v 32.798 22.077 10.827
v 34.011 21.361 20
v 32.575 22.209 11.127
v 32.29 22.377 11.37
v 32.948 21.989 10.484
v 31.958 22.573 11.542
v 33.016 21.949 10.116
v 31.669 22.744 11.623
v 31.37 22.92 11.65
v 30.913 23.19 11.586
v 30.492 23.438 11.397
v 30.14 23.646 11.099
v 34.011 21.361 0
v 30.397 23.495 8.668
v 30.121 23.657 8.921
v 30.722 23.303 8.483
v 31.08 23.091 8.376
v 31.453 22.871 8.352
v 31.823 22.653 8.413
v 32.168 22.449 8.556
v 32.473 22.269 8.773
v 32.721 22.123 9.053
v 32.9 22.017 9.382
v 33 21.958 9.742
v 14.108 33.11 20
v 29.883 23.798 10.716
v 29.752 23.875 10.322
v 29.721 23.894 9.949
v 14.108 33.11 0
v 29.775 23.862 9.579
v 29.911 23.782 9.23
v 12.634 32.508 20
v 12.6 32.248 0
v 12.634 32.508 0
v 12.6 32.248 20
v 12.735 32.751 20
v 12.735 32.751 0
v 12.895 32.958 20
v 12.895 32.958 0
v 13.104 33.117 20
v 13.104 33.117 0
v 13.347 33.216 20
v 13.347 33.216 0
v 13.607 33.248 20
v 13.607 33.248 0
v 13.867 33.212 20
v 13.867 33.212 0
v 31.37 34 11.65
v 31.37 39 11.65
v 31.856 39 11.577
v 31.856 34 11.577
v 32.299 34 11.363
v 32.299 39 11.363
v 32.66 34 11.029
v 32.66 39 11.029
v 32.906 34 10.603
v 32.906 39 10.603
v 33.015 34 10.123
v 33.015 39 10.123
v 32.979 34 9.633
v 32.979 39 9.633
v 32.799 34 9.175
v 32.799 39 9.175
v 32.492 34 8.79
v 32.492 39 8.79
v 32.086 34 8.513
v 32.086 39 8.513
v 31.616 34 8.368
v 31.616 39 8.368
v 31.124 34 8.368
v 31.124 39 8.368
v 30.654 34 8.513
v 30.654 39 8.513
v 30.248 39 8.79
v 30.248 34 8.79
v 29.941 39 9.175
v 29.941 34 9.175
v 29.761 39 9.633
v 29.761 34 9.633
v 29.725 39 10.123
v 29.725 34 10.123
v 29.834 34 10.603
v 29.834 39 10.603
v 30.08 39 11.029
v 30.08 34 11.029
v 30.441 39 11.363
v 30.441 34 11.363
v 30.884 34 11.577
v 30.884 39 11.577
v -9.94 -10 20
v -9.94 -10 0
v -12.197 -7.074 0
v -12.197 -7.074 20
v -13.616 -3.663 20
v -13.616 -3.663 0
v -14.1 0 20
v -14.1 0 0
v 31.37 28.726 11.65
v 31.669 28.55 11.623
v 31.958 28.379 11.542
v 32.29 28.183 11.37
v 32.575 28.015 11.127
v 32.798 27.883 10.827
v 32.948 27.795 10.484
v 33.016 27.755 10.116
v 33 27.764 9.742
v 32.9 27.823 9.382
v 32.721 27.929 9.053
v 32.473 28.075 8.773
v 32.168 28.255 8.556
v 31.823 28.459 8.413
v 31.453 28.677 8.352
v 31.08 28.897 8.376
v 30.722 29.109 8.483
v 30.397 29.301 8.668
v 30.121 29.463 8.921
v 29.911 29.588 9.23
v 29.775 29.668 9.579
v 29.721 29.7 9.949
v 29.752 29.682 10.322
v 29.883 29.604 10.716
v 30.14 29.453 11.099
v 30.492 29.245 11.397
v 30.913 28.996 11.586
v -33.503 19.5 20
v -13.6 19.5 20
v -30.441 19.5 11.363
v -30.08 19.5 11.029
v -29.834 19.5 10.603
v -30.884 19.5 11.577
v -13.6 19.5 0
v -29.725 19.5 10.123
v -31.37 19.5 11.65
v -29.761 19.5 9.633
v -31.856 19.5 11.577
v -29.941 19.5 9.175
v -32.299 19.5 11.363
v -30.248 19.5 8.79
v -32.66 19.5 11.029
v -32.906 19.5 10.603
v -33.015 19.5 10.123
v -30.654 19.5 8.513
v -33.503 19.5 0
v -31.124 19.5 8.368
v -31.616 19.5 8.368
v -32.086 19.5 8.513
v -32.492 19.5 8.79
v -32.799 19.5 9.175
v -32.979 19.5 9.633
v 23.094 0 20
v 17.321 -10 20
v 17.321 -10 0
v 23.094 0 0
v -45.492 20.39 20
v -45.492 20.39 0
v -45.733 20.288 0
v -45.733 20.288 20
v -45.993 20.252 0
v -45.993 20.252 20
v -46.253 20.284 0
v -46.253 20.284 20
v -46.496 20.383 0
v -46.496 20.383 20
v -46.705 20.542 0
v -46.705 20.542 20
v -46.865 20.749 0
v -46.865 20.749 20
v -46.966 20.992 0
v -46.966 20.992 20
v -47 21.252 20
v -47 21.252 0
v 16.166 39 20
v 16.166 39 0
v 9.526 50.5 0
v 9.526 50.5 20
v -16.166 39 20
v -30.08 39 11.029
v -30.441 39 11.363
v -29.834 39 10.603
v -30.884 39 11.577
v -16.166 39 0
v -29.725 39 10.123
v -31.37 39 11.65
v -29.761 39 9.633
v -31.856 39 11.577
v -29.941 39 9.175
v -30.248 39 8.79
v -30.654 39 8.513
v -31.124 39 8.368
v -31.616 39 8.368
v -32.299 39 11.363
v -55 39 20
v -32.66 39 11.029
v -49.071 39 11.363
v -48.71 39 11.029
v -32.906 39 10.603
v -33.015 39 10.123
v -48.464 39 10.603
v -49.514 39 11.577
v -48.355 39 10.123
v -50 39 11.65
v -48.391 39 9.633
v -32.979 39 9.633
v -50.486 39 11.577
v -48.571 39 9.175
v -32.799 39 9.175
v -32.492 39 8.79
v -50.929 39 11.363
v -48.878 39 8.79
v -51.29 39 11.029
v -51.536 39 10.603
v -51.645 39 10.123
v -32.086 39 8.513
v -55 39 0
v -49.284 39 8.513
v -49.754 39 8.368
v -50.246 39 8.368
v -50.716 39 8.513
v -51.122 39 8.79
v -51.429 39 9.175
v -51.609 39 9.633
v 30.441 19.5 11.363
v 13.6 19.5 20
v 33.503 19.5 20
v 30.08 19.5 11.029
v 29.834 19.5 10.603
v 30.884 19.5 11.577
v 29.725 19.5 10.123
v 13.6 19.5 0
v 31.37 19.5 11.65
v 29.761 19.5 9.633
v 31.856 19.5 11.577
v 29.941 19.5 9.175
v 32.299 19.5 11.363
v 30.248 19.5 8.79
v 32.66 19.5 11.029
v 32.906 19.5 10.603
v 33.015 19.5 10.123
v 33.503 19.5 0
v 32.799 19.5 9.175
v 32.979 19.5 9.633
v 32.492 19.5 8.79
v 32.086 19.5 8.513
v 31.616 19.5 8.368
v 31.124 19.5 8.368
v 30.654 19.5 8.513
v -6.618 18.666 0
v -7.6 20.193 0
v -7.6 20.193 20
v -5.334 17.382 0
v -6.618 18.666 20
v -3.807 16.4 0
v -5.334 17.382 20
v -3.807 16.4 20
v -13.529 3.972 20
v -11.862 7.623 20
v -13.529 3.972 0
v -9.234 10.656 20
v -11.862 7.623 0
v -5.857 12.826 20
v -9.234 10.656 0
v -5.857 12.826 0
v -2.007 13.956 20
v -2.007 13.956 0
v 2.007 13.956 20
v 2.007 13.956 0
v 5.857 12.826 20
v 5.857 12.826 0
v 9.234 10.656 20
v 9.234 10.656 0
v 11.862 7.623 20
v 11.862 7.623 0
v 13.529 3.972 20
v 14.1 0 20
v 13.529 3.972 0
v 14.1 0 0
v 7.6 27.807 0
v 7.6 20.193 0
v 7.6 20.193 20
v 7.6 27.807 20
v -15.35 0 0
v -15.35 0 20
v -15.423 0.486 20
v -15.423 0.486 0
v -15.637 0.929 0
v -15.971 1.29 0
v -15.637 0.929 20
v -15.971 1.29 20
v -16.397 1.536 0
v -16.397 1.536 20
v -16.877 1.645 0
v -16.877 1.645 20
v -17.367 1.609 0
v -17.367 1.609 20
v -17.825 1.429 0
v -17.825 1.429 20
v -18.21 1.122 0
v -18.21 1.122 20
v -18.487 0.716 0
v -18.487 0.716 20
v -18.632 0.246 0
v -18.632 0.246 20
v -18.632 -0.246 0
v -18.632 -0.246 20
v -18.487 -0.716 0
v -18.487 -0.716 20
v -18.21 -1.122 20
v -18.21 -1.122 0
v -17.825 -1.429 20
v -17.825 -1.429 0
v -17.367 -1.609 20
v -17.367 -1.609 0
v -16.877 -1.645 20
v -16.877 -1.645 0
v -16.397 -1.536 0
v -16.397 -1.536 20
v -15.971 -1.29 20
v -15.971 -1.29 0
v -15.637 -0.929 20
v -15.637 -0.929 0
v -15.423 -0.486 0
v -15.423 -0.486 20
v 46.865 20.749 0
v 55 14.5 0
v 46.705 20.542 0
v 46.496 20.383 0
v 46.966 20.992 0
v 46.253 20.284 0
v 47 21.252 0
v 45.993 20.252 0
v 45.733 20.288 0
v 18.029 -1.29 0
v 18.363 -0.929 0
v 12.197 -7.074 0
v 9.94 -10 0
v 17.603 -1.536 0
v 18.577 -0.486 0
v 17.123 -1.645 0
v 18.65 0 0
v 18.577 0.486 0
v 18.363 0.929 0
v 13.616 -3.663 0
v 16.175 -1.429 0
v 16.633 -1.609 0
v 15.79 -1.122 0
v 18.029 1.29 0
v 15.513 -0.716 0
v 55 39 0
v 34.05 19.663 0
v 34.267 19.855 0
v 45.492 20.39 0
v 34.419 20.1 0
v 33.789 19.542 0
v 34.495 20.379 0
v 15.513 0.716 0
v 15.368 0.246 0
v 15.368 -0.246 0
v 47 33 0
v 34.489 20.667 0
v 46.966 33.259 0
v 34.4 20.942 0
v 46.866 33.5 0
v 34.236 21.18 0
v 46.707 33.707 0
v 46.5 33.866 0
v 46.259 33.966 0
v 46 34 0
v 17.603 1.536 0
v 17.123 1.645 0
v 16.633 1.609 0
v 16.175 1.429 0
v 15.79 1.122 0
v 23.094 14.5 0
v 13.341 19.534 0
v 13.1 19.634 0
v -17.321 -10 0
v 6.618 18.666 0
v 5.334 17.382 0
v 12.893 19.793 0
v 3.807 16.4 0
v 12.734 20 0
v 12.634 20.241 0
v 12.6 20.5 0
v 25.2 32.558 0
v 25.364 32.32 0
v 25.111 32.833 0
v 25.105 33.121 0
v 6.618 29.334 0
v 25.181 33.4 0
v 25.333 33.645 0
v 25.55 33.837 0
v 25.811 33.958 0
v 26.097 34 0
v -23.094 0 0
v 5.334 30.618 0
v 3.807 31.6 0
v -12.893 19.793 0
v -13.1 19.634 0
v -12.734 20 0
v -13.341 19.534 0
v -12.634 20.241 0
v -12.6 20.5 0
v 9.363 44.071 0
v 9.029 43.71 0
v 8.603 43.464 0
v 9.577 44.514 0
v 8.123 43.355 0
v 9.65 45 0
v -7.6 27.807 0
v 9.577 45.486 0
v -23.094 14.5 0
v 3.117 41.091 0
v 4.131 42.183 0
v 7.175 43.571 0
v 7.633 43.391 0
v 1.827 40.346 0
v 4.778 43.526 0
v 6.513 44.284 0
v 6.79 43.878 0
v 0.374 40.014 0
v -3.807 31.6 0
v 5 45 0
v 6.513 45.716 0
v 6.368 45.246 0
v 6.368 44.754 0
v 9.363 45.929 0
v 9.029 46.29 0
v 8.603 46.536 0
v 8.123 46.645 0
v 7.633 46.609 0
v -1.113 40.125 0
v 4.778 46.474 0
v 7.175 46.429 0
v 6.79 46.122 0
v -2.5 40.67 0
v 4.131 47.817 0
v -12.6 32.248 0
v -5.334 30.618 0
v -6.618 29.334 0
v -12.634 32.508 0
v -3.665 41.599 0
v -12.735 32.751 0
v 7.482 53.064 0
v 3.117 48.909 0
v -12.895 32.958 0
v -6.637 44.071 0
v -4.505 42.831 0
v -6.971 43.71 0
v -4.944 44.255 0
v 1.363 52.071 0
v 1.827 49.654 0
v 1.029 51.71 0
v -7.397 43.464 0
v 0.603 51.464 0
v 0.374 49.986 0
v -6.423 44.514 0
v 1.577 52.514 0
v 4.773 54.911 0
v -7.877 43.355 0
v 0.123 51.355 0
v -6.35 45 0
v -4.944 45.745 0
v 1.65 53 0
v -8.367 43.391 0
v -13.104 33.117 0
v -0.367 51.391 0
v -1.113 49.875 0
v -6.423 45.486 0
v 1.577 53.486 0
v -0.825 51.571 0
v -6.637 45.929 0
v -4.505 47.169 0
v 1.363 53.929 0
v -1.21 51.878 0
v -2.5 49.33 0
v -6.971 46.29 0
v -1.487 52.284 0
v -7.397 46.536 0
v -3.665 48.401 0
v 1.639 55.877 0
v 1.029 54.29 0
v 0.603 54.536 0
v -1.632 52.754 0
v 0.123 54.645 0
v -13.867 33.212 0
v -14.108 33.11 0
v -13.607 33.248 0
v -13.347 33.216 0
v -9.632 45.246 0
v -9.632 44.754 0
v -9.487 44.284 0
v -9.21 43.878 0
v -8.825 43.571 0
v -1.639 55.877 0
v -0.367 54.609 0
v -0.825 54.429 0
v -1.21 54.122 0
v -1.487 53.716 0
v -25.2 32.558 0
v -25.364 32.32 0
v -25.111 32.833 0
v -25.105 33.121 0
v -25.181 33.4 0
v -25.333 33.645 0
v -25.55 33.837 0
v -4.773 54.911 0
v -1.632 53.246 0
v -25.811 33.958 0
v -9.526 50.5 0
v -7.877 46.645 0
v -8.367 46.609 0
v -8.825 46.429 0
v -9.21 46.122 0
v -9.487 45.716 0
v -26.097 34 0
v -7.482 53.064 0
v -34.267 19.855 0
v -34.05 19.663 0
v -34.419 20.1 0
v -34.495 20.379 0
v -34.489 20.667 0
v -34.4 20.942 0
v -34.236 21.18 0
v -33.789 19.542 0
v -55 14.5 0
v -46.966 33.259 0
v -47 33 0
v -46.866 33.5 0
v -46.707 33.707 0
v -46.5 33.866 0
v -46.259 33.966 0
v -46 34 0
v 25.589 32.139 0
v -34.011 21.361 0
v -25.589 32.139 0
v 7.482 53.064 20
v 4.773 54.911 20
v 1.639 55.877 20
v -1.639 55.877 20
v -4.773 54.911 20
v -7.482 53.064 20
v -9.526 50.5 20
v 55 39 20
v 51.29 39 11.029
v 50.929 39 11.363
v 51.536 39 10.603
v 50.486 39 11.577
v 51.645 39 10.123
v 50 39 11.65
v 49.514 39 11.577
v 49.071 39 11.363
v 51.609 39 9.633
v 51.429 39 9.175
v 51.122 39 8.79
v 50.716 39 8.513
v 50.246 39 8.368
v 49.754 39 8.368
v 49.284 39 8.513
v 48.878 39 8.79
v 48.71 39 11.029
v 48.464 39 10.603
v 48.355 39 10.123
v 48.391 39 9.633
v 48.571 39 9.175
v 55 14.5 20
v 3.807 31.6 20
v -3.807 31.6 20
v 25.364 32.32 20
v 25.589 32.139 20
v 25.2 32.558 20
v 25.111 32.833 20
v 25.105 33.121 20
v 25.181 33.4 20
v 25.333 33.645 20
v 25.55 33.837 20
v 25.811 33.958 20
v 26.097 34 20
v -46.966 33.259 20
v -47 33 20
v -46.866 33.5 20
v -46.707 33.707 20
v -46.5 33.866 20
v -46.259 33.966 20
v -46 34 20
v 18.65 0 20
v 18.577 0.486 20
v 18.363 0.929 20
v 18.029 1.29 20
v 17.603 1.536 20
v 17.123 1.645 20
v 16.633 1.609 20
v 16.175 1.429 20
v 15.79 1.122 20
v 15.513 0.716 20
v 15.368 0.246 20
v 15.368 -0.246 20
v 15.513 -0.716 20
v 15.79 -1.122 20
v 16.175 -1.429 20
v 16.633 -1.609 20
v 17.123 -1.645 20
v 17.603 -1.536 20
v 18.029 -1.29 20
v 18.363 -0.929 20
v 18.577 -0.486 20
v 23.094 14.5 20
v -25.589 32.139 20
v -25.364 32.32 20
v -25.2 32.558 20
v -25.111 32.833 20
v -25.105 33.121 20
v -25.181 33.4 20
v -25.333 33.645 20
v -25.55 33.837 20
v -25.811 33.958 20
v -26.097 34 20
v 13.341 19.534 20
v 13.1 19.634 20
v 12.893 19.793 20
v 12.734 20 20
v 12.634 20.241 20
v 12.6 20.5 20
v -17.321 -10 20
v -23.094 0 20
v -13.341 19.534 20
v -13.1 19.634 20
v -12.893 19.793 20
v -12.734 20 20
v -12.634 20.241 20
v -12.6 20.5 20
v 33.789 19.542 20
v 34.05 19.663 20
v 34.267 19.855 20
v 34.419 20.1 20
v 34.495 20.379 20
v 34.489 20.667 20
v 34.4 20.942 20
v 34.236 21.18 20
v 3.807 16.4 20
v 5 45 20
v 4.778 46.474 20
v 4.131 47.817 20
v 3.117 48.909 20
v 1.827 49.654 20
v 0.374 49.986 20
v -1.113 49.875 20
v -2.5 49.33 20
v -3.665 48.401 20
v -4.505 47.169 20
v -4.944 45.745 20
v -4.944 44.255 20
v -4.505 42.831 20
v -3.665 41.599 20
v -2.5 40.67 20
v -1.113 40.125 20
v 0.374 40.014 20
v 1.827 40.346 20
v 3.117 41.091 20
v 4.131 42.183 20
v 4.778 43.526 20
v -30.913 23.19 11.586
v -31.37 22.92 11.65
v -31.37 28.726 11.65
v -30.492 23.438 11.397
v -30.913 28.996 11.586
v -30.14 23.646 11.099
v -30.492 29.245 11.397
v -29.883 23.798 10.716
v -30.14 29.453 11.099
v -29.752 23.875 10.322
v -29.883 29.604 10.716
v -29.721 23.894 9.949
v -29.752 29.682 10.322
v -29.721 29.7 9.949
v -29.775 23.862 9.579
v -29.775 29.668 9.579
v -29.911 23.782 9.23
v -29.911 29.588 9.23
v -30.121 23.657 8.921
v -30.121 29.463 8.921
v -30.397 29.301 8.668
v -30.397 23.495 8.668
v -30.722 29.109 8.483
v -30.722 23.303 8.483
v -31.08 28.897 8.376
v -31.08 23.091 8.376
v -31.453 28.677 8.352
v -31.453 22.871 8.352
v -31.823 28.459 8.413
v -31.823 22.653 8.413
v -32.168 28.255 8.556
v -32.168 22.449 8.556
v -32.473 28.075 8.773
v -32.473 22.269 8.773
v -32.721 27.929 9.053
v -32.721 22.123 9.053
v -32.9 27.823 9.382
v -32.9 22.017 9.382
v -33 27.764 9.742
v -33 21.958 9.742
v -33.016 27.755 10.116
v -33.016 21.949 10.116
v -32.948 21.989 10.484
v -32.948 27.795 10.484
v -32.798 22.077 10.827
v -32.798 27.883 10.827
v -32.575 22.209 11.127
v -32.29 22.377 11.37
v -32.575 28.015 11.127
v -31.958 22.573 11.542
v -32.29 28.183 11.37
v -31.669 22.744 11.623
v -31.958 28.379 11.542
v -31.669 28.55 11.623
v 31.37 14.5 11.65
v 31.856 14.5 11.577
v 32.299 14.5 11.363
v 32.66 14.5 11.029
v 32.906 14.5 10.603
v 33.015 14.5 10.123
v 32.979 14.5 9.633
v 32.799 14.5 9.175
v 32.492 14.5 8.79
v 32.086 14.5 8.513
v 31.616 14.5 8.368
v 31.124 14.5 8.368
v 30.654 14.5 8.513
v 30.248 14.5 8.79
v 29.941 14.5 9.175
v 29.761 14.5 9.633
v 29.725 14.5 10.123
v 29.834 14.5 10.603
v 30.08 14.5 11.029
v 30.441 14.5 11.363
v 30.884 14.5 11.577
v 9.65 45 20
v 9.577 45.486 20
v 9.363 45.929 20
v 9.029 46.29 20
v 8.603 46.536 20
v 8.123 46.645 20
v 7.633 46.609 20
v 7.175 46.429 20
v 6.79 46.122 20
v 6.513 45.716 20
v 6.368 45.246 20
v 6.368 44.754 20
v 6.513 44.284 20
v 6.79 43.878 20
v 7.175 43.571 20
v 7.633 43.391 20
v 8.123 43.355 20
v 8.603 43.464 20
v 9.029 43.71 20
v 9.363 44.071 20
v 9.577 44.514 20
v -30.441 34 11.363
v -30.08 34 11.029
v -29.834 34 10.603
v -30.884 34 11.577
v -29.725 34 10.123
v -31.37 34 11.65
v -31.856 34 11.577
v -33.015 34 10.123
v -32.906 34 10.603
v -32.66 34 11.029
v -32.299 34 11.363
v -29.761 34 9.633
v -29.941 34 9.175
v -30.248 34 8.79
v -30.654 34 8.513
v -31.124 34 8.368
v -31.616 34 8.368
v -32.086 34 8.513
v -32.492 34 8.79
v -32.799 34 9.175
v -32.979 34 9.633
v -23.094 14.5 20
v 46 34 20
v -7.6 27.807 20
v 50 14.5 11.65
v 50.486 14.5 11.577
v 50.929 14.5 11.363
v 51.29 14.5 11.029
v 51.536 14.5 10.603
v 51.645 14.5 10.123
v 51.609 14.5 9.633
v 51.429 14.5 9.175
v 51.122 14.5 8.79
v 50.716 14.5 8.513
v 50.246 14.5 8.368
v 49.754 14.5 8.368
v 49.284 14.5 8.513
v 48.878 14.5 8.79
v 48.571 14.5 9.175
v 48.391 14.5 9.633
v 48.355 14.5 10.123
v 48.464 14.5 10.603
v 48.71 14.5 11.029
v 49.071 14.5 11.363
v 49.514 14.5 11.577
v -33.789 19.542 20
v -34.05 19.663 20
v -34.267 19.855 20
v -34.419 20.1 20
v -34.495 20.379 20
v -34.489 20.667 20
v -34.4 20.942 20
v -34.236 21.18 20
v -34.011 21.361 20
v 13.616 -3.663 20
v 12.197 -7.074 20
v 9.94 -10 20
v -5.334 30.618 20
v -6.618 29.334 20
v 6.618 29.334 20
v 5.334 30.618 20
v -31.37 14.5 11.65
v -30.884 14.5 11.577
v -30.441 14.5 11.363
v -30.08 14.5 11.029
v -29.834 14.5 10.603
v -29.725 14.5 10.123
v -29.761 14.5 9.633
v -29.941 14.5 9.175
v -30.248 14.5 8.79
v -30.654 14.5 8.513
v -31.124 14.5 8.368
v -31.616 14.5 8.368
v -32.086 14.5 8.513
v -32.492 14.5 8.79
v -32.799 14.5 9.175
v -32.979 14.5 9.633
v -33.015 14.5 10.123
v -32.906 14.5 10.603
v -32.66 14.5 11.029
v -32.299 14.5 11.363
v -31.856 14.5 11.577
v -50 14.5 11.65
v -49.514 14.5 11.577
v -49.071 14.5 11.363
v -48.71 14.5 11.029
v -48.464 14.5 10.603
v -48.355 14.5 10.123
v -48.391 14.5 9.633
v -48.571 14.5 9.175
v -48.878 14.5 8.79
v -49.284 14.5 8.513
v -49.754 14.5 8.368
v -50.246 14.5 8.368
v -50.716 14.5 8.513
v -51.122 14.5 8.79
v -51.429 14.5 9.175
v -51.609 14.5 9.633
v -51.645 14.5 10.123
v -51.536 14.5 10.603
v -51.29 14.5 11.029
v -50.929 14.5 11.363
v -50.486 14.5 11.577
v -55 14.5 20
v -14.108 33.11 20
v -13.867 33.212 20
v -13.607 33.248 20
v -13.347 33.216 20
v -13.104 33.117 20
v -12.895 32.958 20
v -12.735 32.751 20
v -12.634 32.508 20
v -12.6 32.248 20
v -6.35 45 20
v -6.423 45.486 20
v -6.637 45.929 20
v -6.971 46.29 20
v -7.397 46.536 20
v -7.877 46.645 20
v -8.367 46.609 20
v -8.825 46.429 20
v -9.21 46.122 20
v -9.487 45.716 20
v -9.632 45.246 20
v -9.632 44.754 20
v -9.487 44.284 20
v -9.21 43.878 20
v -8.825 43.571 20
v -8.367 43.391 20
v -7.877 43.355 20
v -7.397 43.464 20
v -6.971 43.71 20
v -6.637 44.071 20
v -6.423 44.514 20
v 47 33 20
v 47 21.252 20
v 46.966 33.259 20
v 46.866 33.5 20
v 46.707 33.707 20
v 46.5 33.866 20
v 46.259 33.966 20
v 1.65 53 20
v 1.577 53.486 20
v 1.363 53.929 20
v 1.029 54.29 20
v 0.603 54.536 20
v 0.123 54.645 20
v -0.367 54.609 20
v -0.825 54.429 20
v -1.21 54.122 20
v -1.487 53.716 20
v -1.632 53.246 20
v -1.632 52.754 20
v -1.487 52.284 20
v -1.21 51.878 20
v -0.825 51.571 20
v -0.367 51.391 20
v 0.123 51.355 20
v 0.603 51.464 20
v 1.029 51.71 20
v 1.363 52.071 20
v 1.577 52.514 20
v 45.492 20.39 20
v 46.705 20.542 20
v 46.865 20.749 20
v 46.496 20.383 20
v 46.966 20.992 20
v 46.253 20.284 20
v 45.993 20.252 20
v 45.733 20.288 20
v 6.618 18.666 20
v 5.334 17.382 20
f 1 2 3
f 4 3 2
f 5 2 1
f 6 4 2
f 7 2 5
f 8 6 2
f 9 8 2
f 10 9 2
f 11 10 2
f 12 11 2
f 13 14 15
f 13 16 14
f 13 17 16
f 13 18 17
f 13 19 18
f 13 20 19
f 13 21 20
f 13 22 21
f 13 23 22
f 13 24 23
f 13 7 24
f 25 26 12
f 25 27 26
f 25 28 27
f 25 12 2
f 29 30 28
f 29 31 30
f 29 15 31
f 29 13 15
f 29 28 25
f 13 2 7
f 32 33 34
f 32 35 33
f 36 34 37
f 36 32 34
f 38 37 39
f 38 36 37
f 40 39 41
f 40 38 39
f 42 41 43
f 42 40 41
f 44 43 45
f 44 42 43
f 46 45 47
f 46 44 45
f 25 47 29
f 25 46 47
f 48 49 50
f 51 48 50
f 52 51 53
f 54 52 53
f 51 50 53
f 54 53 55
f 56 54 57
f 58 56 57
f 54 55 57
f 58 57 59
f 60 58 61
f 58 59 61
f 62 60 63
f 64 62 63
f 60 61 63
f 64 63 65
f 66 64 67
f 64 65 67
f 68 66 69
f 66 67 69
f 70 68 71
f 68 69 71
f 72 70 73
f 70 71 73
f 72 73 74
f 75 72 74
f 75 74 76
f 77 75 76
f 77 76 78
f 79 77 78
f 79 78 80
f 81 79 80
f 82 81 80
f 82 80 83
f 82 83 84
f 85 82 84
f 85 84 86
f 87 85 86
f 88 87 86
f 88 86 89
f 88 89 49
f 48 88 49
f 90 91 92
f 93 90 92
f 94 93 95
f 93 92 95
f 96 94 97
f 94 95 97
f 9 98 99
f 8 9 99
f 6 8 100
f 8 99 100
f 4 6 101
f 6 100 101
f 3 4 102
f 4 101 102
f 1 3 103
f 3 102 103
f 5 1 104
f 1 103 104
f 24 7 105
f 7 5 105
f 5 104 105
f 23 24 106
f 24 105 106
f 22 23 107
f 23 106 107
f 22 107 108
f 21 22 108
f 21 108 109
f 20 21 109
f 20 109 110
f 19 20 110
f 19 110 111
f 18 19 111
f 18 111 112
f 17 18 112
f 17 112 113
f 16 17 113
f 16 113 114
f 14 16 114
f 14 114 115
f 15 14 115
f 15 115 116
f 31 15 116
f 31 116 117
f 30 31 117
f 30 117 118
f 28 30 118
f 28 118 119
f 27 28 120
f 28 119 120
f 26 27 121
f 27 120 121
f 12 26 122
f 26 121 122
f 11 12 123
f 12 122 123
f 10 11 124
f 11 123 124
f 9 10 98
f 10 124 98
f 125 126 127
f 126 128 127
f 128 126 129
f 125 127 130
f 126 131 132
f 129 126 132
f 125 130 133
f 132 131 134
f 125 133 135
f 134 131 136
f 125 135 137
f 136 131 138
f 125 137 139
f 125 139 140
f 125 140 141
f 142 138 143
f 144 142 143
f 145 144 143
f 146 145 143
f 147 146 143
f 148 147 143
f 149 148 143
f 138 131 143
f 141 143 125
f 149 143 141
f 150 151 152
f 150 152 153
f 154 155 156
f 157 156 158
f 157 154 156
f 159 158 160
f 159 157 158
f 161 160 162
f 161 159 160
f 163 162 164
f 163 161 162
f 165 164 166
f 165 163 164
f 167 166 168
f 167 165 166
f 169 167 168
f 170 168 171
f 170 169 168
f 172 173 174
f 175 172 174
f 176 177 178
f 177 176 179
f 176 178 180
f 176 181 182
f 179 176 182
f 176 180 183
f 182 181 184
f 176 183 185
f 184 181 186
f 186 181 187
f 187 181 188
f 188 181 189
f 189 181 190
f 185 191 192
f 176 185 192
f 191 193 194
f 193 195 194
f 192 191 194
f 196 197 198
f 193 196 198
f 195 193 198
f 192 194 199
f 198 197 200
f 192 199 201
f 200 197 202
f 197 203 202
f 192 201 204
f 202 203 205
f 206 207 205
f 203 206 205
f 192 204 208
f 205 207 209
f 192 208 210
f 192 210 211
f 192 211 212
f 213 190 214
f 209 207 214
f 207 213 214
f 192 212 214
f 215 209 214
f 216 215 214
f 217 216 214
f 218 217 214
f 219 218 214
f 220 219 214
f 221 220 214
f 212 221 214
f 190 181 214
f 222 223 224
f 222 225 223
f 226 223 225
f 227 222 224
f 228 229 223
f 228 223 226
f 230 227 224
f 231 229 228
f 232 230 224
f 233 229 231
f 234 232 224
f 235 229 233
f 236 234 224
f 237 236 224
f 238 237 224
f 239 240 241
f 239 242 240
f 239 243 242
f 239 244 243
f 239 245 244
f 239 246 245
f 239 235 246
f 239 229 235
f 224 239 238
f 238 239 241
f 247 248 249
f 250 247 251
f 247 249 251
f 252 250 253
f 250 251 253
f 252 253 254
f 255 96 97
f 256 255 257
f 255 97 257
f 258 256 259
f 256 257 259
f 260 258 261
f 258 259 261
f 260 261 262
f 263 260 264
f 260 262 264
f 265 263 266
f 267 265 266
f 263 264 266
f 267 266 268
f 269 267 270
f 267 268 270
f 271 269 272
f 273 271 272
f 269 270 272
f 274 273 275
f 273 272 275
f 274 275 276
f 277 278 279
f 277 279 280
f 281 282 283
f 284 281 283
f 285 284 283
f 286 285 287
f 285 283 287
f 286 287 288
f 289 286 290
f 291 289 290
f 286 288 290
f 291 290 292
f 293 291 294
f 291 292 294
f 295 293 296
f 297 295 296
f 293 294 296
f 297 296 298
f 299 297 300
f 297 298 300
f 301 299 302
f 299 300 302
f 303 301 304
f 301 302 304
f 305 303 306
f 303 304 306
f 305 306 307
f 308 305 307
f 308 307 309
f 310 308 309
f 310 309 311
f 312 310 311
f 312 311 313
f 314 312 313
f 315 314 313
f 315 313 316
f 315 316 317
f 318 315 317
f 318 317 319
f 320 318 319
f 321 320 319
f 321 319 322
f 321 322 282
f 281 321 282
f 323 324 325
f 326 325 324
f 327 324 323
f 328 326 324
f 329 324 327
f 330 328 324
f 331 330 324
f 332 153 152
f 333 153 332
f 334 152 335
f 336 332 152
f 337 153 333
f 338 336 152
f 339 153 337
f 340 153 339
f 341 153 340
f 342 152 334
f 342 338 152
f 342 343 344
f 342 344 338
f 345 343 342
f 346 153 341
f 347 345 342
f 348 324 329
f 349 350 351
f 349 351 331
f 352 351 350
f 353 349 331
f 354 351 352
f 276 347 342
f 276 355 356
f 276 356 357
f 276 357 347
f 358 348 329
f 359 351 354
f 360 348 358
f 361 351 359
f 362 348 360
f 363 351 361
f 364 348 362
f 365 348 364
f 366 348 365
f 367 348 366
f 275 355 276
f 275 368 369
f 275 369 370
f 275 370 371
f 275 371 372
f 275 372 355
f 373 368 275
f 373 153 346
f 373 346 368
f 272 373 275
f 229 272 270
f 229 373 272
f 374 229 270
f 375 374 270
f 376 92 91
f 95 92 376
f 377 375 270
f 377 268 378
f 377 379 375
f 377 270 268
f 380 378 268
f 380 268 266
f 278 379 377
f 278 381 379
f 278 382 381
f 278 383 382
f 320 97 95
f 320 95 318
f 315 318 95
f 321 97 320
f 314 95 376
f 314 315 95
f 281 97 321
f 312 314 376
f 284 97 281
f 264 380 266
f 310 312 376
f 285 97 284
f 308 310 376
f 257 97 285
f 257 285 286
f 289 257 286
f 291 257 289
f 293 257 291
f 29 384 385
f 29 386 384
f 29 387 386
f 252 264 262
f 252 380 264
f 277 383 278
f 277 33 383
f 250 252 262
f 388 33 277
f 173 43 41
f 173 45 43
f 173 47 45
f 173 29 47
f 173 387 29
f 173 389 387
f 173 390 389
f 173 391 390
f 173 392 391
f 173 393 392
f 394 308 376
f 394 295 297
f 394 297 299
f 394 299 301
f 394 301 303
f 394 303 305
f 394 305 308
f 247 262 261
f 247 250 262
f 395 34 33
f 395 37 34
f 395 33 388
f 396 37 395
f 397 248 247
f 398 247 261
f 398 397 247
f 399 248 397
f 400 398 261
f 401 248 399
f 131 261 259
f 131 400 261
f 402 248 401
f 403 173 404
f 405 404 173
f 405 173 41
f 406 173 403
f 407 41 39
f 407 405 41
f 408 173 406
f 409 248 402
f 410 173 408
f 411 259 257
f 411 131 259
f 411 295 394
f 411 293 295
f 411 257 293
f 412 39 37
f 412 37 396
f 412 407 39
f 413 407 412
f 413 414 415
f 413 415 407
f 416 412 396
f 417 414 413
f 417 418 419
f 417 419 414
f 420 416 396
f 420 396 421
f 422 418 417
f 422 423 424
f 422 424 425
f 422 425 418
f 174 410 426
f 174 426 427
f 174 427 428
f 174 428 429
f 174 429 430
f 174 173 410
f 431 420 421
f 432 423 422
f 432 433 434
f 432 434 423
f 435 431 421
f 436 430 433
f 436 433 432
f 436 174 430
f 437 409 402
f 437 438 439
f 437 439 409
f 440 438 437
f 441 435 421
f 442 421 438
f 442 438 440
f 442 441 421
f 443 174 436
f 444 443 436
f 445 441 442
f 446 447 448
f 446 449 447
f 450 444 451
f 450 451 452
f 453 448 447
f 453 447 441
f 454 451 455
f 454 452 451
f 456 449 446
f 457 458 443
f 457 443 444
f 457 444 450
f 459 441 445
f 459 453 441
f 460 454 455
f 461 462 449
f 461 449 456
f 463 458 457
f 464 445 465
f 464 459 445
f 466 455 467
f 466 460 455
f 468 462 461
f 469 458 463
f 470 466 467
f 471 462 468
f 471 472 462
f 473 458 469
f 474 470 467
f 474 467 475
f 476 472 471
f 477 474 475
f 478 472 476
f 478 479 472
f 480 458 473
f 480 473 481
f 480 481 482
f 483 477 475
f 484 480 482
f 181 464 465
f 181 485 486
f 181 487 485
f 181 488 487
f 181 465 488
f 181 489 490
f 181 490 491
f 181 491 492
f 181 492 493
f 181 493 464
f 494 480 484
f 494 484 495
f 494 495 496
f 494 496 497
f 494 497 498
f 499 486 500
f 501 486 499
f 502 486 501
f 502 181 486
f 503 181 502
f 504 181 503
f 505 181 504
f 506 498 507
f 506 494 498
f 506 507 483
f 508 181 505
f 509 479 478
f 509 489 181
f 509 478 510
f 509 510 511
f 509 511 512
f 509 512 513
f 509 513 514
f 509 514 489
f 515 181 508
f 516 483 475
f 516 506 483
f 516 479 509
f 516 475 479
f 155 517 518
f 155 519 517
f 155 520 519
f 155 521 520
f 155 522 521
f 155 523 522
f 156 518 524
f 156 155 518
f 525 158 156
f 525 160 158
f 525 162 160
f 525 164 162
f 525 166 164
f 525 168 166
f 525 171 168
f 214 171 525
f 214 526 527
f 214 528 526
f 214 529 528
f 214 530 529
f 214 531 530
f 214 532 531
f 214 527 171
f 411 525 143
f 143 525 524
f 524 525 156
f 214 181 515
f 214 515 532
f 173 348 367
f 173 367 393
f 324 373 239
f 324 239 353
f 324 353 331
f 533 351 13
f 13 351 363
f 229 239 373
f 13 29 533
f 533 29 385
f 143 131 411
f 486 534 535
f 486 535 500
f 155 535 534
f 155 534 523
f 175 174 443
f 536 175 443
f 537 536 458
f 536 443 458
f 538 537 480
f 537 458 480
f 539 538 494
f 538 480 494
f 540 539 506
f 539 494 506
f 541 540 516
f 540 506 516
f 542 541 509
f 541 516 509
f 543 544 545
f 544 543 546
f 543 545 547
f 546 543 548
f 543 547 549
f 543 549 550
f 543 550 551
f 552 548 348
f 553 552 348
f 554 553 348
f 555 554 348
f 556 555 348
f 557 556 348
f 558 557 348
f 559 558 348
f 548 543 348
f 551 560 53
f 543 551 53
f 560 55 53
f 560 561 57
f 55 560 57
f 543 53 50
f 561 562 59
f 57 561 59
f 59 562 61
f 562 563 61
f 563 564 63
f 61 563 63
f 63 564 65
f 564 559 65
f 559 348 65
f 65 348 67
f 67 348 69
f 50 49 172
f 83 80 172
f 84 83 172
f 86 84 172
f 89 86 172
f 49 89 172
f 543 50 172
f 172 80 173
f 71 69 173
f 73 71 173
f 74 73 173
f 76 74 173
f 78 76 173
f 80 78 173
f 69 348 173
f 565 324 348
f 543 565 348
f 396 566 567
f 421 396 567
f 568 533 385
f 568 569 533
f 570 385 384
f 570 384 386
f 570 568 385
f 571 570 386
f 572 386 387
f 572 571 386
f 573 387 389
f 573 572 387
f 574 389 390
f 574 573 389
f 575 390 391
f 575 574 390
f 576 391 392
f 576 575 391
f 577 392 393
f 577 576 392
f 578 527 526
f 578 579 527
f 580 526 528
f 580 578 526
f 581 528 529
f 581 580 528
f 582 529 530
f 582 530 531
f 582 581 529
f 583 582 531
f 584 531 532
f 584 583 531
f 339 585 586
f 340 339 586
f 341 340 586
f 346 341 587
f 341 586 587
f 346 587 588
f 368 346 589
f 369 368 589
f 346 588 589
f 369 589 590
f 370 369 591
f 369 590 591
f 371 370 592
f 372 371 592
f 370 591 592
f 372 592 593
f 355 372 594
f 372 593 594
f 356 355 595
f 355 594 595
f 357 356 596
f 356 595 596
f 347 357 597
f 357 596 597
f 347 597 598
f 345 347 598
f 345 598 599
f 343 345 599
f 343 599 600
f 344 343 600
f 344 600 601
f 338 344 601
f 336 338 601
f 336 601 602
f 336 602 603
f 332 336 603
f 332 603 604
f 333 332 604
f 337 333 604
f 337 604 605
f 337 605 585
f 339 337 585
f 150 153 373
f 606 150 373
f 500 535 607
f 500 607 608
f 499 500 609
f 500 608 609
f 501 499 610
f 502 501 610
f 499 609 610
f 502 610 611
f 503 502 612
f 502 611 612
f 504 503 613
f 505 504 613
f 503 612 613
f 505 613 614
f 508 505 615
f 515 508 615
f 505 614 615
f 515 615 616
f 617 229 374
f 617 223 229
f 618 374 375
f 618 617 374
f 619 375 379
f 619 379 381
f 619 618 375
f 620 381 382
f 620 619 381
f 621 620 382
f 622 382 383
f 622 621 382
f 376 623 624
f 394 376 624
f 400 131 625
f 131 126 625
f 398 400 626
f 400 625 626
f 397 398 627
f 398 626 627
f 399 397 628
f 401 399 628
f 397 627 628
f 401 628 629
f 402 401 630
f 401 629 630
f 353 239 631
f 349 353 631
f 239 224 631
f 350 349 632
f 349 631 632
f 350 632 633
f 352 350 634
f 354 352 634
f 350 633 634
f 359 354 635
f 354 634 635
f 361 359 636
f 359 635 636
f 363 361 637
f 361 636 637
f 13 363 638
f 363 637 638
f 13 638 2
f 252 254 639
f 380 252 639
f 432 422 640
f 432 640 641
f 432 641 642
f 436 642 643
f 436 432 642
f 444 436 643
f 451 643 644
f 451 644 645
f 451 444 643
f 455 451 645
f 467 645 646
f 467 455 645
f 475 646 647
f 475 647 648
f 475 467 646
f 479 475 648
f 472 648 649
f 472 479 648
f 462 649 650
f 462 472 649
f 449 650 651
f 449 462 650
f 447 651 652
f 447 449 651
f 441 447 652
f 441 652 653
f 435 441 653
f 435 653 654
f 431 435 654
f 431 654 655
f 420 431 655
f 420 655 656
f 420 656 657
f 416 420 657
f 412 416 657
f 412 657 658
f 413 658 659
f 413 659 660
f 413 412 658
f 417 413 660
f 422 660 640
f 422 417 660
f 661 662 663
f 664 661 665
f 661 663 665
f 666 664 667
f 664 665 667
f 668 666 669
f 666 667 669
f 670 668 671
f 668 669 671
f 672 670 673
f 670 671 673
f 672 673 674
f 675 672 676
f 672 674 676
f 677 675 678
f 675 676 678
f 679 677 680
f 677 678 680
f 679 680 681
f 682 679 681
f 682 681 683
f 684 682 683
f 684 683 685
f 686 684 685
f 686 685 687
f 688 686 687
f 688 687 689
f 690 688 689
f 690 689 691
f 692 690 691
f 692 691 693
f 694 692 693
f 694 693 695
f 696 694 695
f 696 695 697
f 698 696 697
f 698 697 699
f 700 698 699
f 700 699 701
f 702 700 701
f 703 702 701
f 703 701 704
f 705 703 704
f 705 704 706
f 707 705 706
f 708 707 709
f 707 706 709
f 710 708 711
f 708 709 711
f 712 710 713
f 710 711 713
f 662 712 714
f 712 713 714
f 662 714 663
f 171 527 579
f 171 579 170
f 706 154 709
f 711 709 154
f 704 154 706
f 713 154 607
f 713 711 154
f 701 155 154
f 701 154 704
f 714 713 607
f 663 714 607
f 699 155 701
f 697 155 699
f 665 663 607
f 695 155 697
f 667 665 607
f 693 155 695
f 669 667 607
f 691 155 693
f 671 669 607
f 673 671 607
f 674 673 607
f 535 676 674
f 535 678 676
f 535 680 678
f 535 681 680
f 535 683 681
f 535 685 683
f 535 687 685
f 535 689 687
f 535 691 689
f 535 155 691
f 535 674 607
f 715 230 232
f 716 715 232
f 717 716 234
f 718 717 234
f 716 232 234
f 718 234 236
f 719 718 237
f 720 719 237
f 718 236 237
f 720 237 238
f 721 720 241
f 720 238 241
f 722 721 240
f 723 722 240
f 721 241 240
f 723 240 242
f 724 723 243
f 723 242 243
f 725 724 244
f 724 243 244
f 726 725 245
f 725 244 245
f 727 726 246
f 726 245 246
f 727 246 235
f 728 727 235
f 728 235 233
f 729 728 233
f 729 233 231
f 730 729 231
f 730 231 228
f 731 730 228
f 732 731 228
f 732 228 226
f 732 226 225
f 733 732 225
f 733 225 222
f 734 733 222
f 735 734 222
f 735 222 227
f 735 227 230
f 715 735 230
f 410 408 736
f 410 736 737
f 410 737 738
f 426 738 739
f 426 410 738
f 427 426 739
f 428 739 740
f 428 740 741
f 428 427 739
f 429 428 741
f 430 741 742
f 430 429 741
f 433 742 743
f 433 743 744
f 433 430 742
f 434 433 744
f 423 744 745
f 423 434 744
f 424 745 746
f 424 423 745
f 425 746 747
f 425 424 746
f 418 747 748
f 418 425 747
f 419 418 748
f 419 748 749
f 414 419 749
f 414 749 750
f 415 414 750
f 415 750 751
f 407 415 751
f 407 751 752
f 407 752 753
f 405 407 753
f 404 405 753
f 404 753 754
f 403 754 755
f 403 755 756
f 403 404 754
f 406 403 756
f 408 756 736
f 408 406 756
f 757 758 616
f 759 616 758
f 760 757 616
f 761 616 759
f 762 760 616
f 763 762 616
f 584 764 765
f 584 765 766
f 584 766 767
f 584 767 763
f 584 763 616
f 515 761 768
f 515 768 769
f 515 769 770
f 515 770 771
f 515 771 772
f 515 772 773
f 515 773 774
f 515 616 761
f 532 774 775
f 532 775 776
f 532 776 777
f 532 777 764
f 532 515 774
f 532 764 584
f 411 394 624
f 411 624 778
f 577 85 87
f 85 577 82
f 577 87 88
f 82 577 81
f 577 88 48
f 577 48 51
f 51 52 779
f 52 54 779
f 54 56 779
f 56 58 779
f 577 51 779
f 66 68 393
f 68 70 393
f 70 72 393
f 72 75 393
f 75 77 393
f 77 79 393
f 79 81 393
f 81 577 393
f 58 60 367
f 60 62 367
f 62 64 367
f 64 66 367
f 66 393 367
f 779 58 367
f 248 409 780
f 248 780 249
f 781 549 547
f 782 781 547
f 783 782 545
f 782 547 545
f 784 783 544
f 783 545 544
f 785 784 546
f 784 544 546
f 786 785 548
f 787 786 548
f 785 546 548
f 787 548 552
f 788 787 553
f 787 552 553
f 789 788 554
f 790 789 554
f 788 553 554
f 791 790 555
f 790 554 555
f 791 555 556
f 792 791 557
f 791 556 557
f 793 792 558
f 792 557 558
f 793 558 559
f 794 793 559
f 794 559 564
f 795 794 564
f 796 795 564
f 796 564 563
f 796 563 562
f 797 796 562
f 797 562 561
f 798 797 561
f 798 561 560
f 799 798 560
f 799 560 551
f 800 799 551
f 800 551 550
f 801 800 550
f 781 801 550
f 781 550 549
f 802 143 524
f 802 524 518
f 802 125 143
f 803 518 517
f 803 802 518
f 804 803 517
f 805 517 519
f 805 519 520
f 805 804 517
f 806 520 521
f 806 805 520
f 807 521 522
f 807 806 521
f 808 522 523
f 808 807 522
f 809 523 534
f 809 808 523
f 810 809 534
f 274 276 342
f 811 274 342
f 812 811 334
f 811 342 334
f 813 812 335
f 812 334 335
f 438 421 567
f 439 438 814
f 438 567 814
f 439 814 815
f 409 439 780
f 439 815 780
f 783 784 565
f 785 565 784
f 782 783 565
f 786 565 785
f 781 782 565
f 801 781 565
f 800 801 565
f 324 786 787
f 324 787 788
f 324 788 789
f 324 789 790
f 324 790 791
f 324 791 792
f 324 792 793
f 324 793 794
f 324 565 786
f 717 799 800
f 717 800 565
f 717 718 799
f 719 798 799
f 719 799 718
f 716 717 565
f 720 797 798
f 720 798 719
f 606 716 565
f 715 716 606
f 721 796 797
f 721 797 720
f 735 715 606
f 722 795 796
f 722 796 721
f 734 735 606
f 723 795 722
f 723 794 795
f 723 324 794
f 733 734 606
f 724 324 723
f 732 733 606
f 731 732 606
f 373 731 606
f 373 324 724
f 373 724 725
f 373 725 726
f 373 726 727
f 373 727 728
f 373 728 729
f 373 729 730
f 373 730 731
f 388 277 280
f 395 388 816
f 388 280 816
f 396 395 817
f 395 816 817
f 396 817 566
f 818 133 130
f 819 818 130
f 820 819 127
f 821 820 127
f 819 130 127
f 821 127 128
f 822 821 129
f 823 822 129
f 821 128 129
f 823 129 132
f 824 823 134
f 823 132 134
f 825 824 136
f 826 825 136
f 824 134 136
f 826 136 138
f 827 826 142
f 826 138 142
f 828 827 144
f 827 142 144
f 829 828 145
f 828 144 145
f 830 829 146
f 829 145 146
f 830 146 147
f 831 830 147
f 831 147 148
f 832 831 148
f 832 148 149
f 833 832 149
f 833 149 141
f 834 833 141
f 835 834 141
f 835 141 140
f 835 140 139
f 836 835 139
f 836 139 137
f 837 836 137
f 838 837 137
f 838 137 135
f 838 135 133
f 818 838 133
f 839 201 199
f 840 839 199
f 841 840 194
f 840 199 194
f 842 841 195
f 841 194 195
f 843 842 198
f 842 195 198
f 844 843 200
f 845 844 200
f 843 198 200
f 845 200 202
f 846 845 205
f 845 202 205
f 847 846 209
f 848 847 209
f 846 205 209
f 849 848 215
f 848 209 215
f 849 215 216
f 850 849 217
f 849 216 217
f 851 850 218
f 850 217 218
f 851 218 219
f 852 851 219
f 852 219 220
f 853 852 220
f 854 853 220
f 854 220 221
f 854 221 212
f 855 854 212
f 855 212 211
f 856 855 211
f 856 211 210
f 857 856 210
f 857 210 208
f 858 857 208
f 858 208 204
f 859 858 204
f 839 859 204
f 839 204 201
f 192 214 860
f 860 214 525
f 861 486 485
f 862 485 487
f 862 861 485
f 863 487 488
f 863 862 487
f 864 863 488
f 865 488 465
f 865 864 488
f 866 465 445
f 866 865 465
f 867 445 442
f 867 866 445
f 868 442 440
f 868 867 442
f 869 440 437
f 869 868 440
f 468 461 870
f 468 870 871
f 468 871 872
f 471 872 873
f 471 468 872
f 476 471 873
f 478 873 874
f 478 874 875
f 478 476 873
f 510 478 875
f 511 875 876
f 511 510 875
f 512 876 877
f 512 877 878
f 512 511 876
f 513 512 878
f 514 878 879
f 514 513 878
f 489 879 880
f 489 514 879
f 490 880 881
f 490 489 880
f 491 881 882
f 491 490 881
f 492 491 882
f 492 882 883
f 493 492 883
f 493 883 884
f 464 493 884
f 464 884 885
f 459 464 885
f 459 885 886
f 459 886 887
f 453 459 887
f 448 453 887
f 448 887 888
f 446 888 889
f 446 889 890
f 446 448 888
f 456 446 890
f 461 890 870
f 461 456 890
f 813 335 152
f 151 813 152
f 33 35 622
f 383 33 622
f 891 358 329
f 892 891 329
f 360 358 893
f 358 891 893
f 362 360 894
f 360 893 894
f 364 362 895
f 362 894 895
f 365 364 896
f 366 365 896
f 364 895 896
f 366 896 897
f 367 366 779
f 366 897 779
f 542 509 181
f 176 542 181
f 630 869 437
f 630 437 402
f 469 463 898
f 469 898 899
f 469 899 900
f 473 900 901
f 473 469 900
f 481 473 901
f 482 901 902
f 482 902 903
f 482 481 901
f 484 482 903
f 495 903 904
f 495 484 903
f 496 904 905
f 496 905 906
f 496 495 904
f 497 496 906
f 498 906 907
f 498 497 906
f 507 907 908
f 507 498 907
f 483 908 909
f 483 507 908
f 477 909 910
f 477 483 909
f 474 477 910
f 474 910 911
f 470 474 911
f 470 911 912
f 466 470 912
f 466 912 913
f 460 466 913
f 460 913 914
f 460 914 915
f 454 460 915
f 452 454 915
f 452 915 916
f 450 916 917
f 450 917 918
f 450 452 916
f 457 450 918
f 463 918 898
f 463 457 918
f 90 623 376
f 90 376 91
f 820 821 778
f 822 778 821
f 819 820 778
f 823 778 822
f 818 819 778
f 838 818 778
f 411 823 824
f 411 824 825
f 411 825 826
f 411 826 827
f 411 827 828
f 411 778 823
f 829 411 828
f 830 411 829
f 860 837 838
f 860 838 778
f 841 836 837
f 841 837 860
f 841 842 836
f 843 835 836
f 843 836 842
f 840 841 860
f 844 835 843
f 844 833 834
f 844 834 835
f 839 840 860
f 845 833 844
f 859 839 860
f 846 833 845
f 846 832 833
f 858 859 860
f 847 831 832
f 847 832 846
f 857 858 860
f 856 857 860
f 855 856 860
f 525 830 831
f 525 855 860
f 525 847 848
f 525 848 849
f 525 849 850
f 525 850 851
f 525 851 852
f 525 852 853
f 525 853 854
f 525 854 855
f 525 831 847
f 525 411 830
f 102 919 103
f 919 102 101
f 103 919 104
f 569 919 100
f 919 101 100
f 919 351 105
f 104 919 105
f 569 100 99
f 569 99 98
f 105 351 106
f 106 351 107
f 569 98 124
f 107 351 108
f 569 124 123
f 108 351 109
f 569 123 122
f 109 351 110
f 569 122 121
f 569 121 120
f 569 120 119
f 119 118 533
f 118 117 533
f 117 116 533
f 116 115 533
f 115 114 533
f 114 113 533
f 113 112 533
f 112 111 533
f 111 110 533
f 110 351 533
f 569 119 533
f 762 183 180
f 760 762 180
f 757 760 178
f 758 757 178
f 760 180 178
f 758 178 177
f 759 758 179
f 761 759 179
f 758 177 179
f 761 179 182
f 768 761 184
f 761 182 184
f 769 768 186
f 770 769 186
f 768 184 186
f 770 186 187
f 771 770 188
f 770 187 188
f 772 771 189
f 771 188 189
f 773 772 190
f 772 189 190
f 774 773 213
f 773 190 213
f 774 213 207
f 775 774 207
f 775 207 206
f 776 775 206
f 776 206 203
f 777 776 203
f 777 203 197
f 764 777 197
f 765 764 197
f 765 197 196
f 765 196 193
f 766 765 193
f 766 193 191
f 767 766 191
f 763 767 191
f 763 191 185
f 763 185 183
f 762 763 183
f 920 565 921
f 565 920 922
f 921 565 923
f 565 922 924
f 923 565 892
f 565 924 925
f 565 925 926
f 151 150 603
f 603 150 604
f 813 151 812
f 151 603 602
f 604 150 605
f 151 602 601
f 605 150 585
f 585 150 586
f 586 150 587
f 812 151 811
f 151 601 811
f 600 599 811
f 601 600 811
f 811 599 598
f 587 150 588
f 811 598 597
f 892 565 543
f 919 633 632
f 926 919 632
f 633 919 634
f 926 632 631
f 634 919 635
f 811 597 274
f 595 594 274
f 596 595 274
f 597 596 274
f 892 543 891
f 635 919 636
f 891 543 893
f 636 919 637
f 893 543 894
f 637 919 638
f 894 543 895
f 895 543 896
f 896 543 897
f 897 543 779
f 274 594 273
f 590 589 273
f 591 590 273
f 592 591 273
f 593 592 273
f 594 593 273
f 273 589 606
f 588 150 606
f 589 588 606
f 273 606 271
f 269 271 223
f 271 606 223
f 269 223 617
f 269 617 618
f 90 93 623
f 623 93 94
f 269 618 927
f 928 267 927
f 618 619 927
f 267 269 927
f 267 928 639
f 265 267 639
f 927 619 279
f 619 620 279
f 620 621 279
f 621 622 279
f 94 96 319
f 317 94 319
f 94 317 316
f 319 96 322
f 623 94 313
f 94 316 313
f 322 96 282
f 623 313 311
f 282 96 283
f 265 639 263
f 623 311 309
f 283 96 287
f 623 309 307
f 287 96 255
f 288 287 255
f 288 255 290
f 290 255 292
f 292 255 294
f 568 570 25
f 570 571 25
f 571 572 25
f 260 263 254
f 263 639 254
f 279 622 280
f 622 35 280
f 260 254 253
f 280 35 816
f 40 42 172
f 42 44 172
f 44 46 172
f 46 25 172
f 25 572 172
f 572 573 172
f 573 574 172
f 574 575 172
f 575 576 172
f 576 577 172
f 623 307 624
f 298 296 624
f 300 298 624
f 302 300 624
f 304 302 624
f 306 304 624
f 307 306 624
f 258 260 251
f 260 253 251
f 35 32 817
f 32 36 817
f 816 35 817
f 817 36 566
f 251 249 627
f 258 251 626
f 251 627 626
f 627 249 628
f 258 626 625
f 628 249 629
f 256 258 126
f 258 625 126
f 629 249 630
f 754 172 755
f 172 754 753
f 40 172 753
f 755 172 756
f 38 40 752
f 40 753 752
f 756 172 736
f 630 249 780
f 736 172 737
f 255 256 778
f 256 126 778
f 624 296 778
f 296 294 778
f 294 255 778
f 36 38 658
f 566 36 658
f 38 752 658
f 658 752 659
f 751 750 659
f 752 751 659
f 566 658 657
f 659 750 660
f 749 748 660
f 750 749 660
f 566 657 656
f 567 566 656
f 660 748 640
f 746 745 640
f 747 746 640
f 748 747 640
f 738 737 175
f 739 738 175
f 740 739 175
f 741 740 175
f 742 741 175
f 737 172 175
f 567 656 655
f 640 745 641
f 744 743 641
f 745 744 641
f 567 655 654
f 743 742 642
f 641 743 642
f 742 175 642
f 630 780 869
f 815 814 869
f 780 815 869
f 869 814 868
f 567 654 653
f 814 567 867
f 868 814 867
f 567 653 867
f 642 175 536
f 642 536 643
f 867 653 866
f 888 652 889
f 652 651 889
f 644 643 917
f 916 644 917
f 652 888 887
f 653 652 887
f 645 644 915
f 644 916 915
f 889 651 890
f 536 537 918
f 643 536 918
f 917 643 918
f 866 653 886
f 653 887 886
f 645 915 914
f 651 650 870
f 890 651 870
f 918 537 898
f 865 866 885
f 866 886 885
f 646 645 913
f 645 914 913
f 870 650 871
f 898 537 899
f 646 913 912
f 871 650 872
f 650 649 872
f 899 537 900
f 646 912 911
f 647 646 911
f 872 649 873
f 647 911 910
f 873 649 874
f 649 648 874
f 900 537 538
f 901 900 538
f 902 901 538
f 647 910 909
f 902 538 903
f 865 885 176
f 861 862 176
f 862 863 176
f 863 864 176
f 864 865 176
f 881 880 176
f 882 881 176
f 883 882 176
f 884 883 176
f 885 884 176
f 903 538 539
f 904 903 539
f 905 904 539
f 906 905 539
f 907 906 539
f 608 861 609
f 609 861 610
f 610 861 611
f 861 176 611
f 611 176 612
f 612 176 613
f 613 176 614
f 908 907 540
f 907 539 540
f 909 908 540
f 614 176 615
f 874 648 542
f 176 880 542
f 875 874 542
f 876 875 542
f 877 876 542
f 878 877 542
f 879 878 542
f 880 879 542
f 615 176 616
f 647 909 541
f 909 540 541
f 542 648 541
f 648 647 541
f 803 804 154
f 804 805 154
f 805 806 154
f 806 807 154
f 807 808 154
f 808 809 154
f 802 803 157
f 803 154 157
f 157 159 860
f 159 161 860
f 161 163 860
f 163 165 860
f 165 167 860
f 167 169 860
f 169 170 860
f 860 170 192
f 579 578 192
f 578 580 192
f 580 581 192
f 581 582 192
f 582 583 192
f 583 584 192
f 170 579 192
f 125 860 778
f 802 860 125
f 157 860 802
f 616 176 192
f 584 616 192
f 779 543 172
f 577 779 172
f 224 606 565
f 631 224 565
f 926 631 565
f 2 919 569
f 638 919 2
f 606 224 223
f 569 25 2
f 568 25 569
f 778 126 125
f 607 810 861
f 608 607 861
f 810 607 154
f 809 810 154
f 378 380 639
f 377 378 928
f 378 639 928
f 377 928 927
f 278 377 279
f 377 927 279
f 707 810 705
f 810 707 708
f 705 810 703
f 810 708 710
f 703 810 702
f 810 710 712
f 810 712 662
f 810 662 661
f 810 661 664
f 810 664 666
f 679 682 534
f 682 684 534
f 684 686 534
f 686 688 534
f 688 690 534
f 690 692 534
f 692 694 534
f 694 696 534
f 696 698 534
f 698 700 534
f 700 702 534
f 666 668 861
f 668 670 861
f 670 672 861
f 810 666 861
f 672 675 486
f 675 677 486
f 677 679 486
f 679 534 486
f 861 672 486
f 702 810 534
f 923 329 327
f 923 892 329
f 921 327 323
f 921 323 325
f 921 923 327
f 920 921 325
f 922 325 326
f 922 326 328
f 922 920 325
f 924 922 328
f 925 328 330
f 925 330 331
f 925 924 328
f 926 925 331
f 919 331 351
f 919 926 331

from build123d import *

# Parameters (mm, degrees)
SKETCH_1_R          = 5
SKETCH_1_R_2        = 1.65
EXTRUDE_1_DEPTH     = 20
SKETCH_2_R          = 1.65
CUT_EXTRUDE_1_DEPTH = 71.32780389
EXTRUDE_START       = -20
EXTRUDE_2_DEPTH     = 20
SKETCH_4_R          = 1.65
CUT_EXTRUDE_2_DEPTH = 82
EXTRUDE_5_DEPTH     = 20
CUT_EXTRUDE_3_DEPTH = 20
SKETCH_8_W          = 31.905989232
SKETCH_8_H          = 14.5
CUT_EXTRUDE_5_DEPTH = 82
CUT_EXTRUDE_6_DEPTH = 82
FILLET_3_R          = 1


with BuildPart() as part:
    # 草图1 → 凸台-拉伸1 (new body)
    with BuildSketch(Plane.XY):
        with BuildLine():
            Line((55, 39), (16.165807537, 39))
            Line((16.165807537, 39), (9.526279442, 50.5))
            ThreePointArc((9.526279442, 50.5), (0, 56), (-9.526279442, 50.5))
            Line((-9.526279442, 50.5), (-16.165807537, 39))
            Line((-16.165807537, 39), (-55, 39))
            Line((-55, 39), (-55, 0))
            Line((-55, 0), (-14.1, 0))
            ThreePointArc((-14.1, 0), (0, 14.1), (14.1, 0))
            Line((14.1, 0), (55, 0))
            Line((55, 0), (55, 39))
        make_face()
        with Locations((0, 45)):
            Circle(SKETCH_1_R, mode=Mode.SUBTRACT)
        with Locations((-8, 45)):
            Circle(SKETCH_1_R_2, mode=Mode.SUBTRACT)
        with Locations((8, 45)):
            Circle(SKETCH_1_R_2, mode=Mode.SUBTRACT)
        with Locations((0, 53)):
            Circle(SKETCH_1_R_2, mode=Mode.SUBTRACT)
    extrude(amount=EXTRUDE_1_DEPTH)

    # 草图2 → 切除-拉伸1 (cut, through all)
    with BuildSketch(Plane(origin=(0, 39, 0), x_dir=(1, 0, 0), z_dir=(0, 1, 0))):
        with Locations((-50, -10)):
            Circle(SKETCH_2_R)
        with Locations((-31.37, -10)):
            Circle(SKETCH_2_R)
        with Locations((31.37, -10)):
            Circle(SKETCH_2_R)
        with Locations((50, -10)):
            Circle(SKETCH_2_R)
    extrude(amount=-CUT_EXTRUDE_1_DEPTH, mode=Mode.SUBTRACT)

    # 草图3 → 凸台-拉伸2 (add)
    with BuildSketch(Plane.XY.offset(20).offset(EXTRUDE_START)):
        with BuildLine():
            ThreePointArc((-20, 0), (-19.318516526, -5.176380902), (-17.320508076, -10))
            Line((-17.320508076, -10), (-9.940321926, -10))
            ThreePointArc((-9.940321926, -10), (-13.018612429, -5.415323667), (-14.1, 0))
            Line((-14.1, 0), (-20, 0))
        make_face()
        with BuildLine():
            Line((9.940321926, -10), (17.320508076, -10))
            ThreePointArc((17.320508076, -10), (19.318516526, -5.176380902), (20, 0))
            Line((20, 0), (14.1, 0))
            ThreePointArc((14.1, 0), (13.018612429, -5.415323667), (9.940321926, -10))
        make_face()
    extrude(amount=EXTRUDE_2_DEPTH)

    # 草图4 → 切除-拉伸2 (cut, through all)
    with BuildSketch(Plane.XY.offset(20)):
        with Locations((17, 0)):
            Circle(SKETCH_4_R)
        with Locations((-17, 0)):
            Circle(SKETCH_4_R)
    extrude(amount=-CUT_EXTRUDE_2_DEPTH, mode=Mode.SUBTRACT)

    # 草图5 → 凸台-拉伸5 (add)
    with BuildSketch(Plane.XY.offset(20).offset(EXTRUDE_START)):
        with BuildLine():
            Line((-17.320508076, -10), (-23.094010768, 0))
            Line((-23.094010768, 0), (-20, 0))
            ThreePointArc((-20, 0), (-19.318516526, -5.176380902), (-17.320508076, -10))
        make_face()
        with BuildLine():
            Line((17.320508076, -10), (23.094010768, 0))
            Line((23.094010768, 0), (20, 0))
            ThreePointArc((20, 0), (19.318516526, -5.176380902), (17.320508076, -10))
        make_face()
    extrude(amount=EXTRUDE_5_DEPTH)

    # 草图6 → 切除-拉伸3 (cut)
    with BuildSketch(Plane.XY.offset(20)):
        with BuildLine():
            Line((3.806573262, 31.6), (-3.806573262, 31.6))
            ThreePointArc((-3.806573262, 31.6), (-6.01040764, 30.01040764), (-7.6, 27.806573262))
            Line((-7.6, 27.806573262), (-7.6, 20.193426738))
            ThreePointArc((-7.6, 20.193426738), (-6.01040764, 17.98959236), (-3.806573262, 16.4))
            Line((-3.806573262, 16.4), (3.806573262, 16.4))
            ThreePointArc((3.806573262, 16.4), (6.01040764, 17.98959236), (7.6, 20.193426738))
            Line((7.6, 20.193426738), (7.6, 27.806573262))
            ThreePointArc((7.6, 27.806573262), (6.01040764, 30.01040764), (3.806573262, 31.6))
        make_face()
    extrude(amount=-CUT_EXTRUDE_3_DEPTH, mode=Mode.SUBTRACT)

    # 草图8 → 切除-拉伸5 (cut, through all)
    with BuildSketch(Plane(origin=(0, 0, 0), x_dir=(-1, 0, 0), z_dir=(0, 0, -1))):
        with Locations((-39.047005384, 7.25)):
            Rectangle(SKETCH_8_W, SKETCH_8_H)
        with Locations((39.047005384, 7.25)):
            Rectangle(SKETCH_8_W, SKETCH_8_H)
    extrude(amount=-CUT_EXTRUDE_5_DEPTH, mode=Mode.SUBTRACT)

    # 草图9 → 切除-拉伸6 (cut, through all)
    with BuildSketch(Plane(origin=(0, 0, 0), x_dir=(-1, 0, 0), z_dir=(0, 0, -1))):
        Polygon((-47, 34), (-47, 19.5), (-22.435993944, 34), align=None)
        Polygon((-37.164006056, 19.5), (-12.6, 34), (-12.6, 19.5), align=None)
        Polygon((12.6, 19.5), (37.164006056, 19.5), (12.6, 34), align=None)
        Polygon((22.435993944, 34), (47, 34), (47, 19.5), align=None)
    extrude(amount=-CUT_EXTRUDE_6_DEPTH, mode=Mode.SUBTRACT)

    # 圆角3
    fillet_3_edges = [part.edges().sort_by_distance(p)[0] for p in [
        (-47, 19.5, 10),
        (-47, 34, 10),
        (-22.435993944, 34, 10),
        (-37.164006056, 19.5, 10),
        (-12.6, 34, 10),
        (-12.6, 19.5, 10),
        (12.6, 34, 10),
        (12.6, 19.5, 10),
        (22.435993944, 34, 10),
        (47, 34, 10),
        (47, 19.5, 10),
        (37.164006056, 19.5, 10),
    ]]
    fillet(fillet_3_edges, radius=FILLET_3_R)


solid = part.part
